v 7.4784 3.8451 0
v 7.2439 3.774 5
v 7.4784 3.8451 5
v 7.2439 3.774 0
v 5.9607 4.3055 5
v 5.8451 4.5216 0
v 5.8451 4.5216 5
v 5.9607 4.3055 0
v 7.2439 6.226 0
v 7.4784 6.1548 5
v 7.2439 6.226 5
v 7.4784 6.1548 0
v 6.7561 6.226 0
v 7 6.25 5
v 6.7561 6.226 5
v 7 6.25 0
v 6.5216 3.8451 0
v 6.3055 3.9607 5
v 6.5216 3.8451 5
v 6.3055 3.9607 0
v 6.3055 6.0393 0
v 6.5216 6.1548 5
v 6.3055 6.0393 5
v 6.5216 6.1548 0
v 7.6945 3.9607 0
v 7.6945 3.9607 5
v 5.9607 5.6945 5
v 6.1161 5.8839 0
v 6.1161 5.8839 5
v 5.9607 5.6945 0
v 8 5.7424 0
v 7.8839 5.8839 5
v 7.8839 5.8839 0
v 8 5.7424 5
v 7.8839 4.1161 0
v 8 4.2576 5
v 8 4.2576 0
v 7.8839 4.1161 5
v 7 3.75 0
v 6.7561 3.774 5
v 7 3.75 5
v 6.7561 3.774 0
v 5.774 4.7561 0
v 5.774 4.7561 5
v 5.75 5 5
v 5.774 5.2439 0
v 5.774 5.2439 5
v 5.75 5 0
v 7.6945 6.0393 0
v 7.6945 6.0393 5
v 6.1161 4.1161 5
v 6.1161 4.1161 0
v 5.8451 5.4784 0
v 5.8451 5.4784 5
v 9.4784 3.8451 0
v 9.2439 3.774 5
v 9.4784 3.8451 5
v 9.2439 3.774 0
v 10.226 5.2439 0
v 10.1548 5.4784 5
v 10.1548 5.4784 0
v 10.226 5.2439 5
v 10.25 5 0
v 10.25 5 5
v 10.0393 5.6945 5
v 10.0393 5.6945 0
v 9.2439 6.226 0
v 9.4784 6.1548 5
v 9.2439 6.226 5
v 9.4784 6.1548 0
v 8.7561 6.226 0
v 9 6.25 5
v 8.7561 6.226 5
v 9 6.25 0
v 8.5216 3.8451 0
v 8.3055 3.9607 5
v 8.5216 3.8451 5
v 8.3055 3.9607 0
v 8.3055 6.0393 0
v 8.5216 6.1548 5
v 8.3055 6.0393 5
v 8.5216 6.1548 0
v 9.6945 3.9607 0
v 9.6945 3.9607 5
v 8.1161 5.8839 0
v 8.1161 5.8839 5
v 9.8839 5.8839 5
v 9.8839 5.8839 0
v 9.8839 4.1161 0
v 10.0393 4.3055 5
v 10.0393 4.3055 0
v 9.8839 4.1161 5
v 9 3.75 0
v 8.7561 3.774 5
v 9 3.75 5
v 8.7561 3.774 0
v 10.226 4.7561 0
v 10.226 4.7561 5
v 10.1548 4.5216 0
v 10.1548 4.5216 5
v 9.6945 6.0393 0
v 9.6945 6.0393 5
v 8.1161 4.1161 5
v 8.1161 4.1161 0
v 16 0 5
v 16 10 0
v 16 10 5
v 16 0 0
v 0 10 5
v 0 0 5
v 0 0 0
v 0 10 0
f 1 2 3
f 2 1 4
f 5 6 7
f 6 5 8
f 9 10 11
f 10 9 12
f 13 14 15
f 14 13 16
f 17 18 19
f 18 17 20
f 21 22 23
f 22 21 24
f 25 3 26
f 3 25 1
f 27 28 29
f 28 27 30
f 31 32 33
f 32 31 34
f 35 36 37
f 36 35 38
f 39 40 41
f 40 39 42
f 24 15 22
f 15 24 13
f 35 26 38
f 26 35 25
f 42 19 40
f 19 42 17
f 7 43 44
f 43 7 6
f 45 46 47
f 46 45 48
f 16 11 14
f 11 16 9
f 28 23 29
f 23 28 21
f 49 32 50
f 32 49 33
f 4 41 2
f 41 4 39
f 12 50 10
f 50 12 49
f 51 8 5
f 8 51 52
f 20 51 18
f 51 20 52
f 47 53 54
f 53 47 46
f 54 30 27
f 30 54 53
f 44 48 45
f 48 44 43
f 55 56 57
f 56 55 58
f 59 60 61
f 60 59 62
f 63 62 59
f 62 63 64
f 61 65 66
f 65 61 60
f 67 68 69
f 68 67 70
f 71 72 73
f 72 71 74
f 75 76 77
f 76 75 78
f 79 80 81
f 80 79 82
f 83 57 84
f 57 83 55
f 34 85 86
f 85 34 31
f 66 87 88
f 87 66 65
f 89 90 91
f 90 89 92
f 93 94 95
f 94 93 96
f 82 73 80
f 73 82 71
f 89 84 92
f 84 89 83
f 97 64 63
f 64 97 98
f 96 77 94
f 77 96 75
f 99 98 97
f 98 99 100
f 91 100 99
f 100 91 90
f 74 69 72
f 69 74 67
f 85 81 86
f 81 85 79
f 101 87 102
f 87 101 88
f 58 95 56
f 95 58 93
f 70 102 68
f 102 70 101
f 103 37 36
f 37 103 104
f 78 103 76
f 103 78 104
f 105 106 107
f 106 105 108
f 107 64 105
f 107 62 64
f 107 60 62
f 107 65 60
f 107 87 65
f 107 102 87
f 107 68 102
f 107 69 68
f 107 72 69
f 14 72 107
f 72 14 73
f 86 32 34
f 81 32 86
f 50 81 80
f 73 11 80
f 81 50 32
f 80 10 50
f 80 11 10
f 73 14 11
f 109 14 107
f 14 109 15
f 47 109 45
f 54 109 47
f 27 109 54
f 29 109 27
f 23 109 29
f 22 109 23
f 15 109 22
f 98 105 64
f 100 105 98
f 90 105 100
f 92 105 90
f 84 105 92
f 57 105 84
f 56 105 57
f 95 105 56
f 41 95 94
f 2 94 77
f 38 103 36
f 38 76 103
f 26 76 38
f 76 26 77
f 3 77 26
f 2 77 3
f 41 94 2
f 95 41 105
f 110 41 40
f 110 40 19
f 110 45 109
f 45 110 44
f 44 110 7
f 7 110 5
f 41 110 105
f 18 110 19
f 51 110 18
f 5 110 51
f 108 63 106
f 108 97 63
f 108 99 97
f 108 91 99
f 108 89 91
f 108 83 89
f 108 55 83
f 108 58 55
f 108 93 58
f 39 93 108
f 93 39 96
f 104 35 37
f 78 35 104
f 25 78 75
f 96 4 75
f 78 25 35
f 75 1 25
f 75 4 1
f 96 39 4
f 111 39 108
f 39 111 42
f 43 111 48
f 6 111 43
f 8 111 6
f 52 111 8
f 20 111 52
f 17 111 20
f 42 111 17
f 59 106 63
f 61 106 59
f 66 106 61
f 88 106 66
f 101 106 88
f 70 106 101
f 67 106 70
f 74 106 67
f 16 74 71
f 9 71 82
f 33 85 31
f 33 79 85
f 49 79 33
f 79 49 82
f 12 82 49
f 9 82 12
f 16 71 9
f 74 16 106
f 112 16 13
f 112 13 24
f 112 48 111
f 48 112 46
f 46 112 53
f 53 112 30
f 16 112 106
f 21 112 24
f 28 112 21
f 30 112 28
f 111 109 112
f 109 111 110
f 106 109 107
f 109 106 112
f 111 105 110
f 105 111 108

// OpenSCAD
$fn = 32;

// ----------------------------------------------------------------------
// Micro pad: two-hole pad, 5-20 mm class
// ----------------------------------------------------------------------

// --- parameters (mm) ---
pad_l = 16;               // pad length, X
pad_w = 10;               // pad width, Y
pad_t = 5;                // pad thickness, Z
hole_d = 2.5;             // hole diameter
hole_x = 7;               // X of the first hole centre

difference() {
  cube([pad_l, pad_w, pad_t]);
  for (x = [hole_x, pad_l - hole_x])
    translate([x, pad_w / 2, -1])
      cylinder(h = pad_t + 2, d = hole_d);
}
